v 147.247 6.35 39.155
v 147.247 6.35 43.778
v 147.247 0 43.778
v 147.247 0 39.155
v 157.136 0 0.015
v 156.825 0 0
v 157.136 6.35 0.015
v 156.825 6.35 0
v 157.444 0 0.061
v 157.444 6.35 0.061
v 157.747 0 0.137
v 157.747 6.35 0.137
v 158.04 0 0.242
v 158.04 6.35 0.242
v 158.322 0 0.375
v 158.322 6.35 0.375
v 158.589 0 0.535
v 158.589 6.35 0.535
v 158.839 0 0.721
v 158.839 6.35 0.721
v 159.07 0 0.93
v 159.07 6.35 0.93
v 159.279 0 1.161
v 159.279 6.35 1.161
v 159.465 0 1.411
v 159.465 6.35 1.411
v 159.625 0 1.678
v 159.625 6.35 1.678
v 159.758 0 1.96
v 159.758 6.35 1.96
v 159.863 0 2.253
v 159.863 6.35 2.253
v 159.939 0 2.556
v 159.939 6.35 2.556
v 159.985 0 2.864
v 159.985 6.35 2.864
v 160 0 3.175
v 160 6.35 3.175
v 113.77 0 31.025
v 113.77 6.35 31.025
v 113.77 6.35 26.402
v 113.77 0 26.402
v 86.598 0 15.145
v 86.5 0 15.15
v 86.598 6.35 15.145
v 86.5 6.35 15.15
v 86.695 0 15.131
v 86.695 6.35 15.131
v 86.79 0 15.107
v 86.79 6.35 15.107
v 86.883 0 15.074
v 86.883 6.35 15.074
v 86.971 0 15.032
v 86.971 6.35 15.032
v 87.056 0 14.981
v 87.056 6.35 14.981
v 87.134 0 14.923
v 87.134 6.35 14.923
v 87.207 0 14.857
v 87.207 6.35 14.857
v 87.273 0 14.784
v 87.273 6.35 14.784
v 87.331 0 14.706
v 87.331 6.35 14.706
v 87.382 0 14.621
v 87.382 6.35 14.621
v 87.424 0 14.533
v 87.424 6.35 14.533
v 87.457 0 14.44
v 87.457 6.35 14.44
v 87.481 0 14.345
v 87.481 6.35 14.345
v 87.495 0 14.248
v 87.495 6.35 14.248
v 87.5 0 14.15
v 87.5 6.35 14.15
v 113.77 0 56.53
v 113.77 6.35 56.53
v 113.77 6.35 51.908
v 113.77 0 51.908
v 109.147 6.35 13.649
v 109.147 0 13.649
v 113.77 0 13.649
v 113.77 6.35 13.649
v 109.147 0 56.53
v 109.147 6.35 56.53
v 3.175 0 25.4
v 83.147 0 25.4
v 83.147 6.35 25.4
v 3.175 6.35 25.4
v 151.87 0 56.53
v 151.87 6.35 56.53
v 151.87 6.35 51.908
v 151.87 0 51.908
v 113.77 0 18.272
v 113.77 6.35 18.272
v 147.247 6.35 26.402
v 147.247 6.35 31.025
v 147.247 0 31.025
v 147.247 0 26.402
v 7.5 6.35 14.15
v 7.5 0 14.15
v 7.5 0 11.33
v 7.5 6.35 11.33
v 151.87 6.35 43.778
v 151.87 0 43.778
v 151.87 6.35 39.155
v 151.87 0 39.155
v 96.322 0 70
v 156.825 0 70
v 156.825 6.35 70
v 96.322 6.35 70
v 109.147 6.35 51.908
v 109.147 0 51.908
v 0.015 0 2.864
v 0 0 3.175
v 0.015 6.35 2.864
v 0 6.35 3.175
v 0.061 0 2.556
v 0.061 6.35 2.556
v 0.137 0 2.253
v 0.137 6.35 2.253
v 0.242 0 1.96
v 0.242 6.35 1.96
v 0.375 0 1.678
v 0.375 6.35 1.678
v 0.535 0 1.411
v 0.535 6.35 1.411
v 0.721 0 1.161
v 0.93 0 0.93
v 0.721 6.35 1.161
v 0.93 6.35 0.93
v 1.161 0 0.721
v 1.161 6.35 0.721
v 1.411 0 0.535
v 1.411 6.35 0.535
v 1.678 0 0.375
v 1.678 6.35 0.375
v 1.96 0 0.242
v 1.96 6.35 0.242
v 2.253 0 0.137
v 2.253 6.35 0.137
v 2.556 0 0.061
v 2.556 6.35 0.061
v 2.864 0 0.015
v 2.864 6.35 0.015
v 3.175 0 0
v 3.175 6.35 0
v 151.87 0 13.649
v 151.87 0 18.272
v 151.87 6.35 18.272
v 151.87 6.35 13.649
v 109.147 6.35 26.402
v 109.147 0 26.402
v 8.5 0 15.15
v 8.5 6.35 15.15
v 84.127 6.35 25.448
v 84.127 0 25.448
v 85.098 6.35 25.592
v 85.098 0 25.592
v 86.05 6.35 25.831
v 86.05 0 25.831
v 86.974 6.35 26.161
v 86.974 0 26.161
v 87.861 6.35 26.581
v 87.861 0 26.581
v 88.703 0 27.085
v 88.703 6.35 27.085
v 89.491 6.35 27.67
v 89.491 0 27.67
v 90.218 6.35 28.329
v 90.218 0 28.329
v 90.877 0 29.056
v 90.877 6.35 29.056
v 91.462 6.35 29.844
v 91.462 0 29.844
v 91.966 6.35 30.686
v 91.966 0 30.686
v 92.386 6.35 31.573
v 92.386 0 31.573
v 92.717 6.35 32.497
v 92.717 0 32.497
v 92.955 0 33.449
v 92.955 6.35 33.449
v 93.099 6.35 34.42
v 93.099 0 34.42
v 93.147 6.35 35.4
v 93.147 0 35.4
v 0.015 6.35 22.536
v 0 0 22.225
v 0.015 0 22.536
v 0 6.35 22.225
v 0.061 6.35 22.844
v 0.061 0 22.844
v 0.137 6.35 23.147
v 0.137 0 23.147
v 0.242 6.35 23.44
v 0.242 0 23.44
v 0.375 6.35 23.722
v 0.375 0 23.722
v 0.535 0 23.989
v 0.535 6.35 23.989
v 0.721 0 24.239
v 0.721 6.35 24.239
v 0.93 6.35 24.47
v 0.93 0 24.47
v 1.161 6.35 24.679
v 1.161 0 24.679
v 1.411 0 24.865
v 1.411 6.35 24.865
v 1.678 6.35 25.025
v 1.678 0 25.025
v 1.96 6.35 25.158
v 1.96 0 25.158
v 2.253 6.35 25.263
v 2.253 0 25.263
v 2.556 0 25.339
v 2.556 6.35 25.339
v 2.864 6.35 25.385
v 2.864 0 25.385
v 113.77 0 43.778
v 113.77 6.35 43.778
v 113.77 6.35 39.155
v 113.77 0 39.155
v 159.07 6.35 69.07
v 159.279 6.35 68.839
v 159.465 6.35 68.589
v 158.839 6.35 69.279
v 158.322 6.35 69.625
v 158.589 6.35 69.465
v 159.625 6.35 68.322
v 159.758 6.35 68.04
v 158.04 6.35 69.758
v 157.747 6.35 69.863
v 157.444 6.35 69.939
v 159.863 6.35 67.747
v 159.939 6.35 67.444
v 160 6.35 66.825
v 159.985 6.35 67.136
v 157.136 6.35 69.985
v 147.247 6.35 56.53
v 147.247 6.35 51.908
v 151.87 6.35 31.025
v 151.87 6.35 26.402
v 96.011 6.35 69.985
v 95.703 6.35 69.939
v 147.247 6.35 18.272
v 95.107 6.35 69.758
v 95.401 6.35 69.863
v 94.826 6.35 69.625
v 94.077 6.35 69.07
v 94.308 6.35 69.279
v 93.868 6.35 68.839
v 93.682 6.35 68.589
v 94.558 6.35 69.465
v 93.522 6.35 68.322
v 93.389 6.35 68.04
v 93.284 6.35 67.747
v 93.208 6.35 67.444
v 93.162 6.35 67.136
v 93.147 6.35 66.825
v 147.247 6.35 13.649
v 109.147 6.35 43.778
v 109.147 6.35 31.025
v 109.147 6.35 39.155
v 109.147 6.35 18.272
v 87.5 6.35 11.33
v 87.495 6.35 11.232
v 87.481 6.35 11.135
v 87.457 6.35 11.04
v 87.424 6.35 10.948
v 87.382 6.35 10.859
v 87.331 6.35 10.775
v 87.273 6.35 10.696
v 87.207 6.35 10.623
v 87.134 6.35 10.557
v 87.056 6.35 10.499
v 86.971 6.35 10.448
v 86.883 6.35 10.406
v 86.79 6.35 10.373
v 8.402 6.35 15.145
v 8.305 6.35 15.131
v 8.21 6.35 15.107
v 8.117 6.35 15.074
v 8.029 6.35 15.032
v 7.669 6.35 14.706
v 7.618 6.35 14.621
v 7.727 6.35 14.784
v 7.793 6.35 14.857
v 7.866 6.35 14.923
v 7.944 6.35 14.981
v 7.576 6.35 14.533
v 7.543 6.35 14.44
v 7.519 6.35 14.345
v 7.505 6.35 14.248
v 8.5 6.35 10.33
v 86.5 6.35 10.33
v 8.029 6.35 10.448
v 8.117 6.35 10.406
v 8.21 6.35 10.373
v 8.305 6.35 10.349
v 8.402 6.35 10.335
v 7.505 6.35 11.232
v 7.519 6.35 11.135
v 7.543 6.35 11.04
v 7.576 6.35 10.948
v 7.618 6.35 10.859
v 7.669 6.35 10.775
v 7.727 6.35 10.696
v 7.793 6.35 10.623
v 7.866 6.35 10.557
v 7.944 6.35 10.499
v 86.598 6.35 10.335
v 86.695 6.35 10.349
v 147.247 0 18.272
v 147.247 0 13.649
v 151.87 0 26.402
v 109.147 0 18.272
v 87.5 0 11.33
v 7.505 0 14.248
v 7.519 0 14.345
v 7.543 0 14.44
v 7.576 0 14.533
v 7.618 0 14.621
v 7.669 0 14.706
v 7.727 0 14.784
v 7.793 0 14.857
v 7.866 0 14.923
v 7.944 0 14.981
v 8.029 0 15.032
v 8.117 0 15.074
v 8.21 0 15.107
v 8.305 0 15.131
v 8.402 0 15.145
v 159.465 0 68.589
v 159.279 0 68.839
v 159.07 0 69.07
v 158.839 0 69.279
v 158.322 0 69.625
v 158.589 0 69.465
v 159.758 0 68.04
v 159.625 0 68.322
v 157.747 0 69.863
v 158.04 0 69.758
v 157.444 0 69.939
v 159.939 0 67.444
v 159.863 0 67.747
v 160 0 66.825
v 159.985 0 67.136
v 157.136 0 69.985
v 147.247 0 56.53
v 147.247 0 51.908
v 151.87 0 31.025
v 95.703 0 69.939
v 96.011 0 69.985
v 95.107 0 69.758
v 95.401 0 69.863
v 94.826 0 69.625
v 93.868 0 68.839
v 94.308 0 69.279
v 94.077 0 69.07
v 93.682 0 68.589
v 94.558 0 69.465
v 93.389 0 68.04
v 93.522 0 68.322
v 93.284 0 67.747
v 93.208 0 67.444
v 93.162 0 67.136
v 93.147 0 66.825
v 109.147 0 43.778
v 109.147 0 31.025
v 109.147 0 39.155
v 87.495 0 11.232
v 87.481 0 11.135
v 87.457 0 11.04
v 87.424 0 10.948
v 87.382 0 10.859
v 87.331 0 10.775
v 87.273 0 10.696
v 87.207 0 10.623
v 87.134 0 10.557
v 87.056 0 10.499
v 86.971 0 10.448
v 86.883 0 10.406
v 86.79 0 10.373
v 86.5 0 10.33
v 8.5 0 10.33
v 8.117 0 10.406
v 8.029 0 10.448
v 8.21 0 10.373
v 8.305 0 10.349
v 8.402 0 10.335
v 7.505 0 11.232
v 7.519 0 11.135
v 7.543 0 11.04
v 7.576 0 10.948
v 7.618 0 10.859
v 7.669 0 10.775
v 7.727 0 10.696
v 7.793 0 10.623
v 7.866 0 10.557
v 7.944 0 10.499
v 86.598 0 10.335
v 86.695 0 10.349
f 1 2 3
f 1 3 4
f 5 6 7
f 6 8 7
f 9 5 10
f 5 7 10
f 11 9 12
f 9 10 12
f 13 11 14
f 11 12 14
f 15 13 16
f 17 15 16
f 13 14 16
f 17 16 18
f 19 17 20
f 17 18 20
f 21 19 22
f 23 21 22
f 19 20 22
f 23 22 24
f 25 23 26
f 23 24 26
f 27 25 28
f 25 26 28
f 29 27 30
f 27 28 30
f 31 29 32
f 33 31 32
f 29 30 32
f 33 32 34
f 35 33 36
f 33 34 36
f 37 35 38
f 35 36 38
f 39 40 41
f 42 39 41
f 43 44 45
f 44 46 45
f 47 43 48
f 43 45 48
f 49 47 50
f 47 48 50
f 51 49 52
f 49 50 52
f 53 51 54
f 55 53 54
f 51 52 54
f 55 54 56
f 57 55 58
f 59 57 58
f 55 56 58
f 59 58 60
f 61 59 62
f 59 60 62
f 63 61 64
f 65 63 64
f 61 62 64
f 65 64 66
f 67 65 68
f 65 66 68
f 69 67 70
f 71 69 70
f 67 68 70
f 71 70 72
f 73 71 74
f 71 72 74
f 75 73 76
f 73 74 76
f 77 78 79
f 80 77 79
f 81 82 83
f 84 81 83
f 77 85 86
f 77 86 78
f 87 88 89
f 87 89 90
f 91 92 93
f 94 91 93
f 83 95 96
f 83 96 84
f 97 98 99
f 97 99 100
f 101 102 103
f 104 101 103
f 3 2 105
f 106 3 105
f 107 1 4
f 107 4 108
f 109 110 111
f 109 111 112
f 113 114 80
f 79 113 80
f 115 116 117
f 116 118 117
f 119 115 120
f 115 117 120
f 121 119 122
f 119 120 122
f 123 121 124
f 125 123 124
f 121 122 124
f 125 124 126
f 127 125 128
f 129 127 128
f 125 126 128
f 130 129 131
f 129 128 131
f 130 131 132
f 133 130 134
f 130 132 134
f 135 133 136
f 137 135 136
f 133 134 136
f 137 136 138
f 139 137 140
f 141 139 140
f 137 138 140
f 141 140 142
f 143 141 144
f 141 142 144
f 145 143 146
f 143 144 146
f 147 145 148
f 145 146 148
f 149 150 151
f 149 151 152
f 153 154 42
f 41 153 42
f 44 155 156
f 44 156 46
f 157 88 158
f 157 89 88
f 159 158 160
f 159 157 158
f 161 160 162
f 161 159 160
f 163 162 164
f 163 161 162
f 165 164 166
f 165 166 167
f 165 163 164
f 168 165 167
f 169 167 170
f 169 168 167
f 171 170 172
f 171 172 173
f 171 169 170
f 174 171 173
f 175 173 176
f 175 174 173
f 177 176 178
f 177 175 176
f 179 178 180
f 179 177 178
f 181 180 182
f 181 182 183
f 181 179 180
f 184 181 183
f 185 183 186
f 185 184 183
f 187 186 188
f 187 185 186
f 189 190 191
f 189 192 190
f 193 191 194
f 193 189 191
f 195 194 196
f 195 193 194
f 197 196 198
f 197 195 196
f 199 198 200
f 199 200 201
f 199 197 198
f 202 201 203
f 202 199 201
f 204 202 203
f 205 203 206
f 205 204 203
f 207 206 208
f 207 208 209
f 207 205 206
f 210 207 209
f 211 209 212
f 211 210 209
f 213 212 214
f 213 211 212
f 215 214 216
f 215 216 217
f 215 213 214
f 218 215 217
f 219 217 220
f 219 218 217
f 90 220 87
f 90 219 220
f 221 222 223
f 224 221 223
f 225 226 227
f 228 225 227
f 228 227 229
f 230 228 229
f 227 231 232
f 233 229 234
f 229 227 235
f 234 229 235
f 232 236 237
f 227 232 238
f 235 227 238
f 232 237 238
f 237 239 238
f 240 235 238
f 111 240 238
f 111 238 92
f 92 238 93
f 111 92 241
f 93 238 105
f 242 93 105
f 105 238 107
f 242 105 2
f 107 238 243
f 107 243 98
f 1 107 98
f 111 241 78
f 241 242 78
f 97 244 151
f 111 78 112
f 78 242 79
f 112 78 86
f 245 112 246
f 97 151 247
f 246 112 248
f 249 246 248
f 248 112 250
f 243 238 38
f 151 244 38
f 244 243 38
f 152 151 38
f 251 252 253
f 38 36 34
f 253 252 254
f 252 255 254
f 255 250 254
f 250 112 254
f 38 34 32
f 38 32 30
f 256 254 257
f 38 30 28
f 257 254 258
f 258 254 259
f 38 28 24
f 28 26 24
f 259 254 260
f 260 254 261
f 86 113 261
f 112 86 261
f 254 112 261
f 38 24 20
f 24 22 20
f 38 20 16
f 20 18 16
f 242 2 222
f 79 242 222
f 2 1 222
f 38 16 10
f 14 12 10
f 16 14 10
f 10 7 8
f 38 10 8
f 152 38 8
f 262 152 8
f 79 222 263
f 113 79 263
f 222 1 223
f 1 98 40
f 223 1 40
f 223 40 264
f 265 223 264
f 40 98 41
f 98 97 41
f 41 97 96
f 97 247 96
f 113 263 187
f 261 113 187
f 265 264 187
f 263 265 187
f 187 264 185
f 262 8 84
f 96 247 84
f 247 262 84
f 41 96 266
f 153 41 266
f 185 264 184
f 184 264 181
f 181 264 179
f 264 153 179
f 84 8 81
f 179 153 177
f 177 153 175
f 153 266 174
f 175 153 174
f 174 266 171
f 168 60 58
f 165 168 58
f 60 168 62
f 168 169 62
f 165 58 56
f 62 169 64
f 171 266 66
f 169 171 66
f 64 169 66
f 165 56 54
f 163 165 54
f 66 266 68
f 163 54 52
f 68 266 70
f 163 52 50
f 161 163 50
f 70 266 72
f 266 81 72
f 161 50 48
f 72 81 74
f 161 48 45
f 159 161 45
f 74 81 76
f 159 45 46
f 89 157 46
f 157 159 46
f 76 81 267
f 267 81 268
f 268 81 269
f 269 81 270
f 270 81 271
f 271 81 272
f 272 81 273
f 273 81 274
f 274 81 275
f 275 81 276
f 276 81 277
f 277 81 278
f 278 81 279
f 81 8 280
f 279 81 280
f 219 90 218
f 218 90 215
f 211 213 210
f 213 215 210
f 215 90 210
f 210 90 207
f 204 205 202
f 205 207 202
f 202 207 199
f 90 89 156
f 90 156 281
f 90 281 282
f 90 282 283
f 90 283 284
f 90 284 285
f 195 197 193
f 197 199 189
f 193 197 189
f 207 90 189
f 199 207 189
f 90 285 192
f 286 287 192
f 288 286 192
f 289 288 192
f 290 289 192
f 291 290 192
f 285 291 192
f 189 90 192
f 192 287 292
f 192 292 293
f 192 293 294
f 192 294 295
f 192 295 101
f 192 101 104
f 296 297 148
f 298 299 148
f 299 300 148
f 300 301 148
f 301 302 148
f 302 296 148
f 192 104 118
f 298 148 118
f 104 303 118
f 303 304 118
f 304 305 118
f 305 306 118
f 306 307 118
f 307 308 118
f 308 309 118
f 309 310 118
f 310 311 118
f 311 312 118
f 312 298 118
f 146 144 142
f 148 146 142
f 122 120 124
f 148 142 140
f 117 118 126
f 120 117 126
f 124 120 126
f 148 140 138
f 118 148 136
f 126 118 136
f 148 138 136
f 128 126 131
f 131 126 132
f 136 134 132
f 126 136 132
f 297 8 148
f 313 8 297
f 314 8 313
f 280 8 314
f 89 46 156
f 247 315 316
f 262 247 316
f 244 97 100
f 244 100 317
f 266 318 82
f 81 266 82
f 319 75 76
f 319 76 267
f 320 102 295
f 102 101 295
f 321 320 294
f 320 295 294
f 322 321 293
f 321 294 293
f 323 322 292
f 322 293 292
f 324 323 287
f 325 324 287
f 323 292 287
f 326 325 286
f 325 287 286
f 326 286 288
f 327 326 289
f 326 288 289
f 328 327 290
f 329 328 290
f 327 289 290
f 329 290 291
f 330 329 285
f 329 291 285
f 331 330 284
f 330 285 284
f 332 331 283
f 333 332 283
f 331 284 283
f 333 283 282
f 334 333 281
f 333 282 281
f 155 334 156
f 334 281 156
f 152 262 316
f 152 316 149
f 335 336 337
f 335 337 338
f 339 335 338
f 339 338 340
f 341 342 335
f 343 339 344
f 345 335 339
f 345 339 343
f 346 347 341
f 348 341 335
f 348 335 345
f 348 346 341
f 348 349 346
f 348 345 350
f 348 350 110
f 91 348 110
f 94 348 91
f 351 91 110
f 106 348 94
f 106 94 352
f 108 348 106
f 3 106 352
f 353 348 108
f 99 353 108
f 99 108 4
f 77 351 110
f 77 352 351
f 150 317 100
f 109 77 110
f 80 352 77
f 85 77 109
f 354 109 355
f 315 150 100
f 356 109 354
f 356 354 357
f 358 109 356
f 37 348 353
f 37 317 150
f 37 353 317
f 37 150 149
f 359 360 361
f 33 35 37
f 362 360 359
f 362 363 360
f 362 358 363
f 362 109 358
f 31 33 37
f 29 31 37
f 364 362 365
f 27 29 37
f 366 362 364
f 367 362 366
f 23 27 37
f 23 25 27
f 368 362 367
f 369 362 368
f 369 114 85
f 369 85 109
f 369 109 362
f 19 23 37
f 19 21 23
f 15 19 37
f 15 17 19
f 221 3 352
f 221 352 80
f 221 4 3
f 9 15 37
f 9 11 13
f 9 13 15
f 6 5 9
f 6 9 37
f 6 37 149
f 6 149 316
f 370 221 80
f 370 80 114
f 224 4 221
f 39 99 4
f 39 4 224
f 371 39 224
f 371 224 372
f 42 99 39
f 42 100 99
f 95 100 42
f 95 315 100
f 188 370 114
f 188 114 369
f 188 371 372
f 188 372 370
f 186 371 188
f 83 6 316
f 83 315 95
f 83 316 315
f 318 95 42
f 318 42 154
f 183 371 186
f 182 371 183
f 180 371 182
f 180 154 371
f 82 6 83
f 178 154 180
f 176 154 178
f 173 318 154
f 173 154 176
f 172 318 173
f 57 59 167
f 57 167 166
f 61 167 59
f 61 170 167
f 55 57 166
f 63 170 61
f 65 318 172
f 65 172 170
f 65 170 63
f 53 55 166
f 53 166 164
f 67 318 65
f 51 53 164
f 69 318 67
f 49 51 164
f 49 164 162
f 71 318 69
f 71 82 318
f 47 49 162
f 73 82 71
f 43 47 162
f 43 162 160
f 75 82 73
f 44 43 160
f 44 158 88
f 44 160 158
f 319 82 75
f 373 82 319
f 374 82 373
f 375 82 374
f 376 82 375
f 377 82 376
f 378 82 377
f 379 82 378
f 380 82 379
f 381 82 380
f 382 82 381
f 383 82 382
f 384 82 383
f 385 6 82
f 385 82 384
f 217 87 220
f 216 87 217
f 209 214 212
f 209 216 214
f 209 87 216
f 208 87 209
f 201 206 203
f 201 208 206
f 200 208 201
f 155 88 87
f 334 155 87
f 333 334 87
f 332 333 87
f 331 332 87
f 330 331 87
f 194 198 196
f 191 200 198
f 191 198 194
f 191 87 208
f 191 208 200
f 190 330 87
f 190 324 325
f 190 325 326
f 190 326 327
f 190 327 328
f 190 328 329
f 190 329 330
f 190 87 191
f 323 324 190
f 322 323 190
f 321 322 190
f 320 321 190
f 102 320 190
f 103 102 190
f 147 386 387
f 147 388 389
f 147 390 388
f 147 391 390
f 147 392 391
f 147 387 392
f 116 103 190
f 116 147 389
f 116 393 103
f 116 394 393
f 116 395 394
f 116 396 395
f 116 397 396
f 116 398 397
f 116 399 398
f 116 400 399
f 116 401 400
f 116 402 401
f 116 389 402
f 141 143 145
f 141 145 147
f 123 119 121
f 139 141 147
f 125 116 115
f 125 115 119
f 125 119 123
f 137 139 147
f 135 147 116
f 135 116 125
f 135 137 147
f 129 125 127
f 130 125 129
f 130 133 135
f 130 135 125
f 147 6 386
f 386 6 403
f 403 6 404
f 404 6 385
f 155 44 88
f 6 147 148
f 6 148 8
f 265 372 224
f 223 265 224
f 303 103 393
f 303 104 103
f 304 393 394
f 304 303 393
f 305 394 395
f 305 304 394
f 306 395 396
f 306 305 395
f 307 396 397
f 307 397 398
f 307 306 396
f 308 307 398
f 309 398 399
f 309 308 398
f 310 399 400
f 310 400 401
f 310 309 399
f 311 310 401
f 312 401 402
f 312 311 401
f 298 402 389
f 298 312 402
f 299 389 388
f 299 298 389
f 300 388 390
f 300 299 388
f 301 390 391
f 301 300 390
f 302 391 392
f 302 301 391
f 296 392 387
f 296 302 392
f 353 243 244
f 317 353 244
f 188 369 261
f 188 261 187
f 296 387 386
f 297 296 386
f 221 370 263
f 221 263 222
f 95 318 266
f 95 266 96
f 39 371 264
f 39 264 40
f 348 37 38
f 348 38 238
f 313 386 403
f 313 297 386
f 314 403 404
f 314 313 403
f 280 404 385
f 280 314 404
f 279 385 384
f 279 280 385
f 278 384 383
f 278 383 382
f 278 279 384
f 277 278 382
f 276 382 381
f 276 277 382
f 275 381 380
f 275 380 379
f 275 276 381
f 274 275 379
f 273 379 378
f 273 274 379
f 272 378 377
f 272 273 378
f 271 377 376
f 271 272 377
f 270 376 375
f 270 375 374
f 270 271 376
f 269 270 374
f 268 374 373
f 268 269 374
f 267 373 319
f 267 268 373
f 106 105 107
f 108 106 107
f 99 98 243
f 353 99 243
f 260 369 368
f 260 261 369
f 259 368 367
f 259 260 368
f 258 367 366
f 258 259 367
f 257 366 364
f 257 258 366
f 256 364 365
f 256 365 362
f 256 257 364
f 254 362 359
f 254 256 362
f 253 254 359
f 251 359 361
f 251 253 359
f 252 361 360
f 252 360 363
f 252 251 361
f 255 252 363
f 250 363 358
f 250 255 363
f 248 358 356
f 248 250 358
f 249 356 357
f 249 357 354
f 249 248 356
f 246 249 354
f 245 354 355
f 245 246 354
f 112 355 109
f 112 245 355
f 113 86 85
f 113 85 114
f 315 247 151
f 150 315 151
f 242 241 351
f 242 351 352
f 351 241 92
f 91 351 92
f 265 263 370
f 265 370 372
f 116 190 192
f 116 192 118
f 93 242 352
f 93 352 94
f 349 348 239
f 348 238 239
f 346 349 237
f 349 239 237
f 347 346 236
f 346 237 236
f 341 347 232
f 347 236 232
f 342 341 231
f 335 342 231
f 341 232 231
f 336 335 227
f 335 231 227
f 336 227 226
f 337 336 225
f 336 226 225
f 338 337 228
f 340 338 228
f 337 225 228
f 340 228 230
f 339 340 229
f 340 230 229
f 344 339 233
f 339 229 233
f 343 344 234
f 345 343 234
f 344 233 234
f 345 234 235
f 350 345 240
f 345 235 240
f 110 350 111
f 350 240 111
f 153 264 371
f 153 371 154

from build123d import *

# Parameters (mm, degrees)
SKETCH1_W           = 80
SKETCH1_H           = 4.819787269
SKETCH1_W_2         = 4.6228
SKETCH1_H_2         = 4.6228
BOSS_EXTRUDE1_DEPTH = 6.35
FILLET2_R           = 3.175
FILLET3_R           = 3.175
FILLET4_R           = 10
FILLET5_R           = 1


with BuildPart() as part:
    # Sketch1 → Boss-Extrude1 (new body)
    with BuildSketch(Plane(origin=(0, 0, 0), x_dir=(1, 0, 0), z_dir=(0, 1, 0))):
        Polygon((0, 0), (160, 0), (160, -70), (93.1472, -70), (93.1472, -25.4), (0, -25.4), align=None)
        with Locations((47.5, -12.740106366)):
            Rectangle(SKETCH1_W, SKETCH1_H, mode=Mode.SUBTRACT)
        with Locations((149.5586, -15.96068286)):
            Rectangle(SKETCH1_W_2, SKETCH1_H_2, mode=Mode.SUBTRACT)
        with Locations((149.5586, -28.71348286)):
            Rectangle(SKETCH1_W_2, SKETCH1_H_2, mode=Mode.SUBTRACT)
        with Locations((149.5586, -41.46628286)):
            Rectangle(SKETCH1_W_2, SKETCH1_H_2, mode=Mode.SUBTRACT)
        with Locations((111.4586, -15.96068286)):
            Rectangle(SKETCH1_W_2, SKETCH1_H_2, mode=Mode.SUBTRACT)
        with Locations((111.4586, -28.71348286)):
            Rectangle(SKETCH1_W_2, SKETCH1_H_2, mode=Mode.SUBTRACT)
        with Locations((111.4586, -41.46628286)):
            Rectangle(SKETCH1_W_2, SKETCH1_H_2, mode=Mode.SUBTRACT)
        with Locations((149.5586, -54.21908286)):
            Rectangle(SKETCH1_W_2, SKETCH1_H_2, mode=Mode.SUBTRACT)
        with Locations((111.4586, -54.21908286)):
            Rectangle(SKETCH1_W_2, SKETCH1_H_2, mode=Mode.SUBTRACT)
    extrude(amount=BOSS_EXTRUDE1_DEPTH)

    # Fillet2
    fillet2_edges = [part.edges().sort_by_distance(p)[0] for p in [
        (0, 3.175, 25.4),
    ]]
    fillet(fillet2_edges, radius=FILLET2_R)

    # Fillet3
    fillet3_edges = [part.edges().sort_by_distance(p)[0] for p in [
        (0, 3.175, 0),
        (160, 3.175, 0),
        (160, 3.175, 70),
        (93.1472, 3.175, 70),
    ]]
    fillet(fillet3_edges, radius=FILLET3_R)

    # Fillet4
    fillet4_edges = [part.edges().sort_by_distance(p)[0] for p in [
        (93.1472, 3.175, 25.4),
    ]]
    fillet(fillet4_edges, radius=FILLET4_R)

    # Fillet5
    fillet5_edges = [part.edges().sort_by_distance(p)[0] for p in [
        (7.5, 3.175, 10.330212731),
        (7.5, 3.175, 15.15),
        (87.5, 3.175, 15.15),
        (87.5, 3.175, 10.330212731),
    ]]
    fillet(fillet5_edges, radius=FILLET5_R)


solid = part.part
